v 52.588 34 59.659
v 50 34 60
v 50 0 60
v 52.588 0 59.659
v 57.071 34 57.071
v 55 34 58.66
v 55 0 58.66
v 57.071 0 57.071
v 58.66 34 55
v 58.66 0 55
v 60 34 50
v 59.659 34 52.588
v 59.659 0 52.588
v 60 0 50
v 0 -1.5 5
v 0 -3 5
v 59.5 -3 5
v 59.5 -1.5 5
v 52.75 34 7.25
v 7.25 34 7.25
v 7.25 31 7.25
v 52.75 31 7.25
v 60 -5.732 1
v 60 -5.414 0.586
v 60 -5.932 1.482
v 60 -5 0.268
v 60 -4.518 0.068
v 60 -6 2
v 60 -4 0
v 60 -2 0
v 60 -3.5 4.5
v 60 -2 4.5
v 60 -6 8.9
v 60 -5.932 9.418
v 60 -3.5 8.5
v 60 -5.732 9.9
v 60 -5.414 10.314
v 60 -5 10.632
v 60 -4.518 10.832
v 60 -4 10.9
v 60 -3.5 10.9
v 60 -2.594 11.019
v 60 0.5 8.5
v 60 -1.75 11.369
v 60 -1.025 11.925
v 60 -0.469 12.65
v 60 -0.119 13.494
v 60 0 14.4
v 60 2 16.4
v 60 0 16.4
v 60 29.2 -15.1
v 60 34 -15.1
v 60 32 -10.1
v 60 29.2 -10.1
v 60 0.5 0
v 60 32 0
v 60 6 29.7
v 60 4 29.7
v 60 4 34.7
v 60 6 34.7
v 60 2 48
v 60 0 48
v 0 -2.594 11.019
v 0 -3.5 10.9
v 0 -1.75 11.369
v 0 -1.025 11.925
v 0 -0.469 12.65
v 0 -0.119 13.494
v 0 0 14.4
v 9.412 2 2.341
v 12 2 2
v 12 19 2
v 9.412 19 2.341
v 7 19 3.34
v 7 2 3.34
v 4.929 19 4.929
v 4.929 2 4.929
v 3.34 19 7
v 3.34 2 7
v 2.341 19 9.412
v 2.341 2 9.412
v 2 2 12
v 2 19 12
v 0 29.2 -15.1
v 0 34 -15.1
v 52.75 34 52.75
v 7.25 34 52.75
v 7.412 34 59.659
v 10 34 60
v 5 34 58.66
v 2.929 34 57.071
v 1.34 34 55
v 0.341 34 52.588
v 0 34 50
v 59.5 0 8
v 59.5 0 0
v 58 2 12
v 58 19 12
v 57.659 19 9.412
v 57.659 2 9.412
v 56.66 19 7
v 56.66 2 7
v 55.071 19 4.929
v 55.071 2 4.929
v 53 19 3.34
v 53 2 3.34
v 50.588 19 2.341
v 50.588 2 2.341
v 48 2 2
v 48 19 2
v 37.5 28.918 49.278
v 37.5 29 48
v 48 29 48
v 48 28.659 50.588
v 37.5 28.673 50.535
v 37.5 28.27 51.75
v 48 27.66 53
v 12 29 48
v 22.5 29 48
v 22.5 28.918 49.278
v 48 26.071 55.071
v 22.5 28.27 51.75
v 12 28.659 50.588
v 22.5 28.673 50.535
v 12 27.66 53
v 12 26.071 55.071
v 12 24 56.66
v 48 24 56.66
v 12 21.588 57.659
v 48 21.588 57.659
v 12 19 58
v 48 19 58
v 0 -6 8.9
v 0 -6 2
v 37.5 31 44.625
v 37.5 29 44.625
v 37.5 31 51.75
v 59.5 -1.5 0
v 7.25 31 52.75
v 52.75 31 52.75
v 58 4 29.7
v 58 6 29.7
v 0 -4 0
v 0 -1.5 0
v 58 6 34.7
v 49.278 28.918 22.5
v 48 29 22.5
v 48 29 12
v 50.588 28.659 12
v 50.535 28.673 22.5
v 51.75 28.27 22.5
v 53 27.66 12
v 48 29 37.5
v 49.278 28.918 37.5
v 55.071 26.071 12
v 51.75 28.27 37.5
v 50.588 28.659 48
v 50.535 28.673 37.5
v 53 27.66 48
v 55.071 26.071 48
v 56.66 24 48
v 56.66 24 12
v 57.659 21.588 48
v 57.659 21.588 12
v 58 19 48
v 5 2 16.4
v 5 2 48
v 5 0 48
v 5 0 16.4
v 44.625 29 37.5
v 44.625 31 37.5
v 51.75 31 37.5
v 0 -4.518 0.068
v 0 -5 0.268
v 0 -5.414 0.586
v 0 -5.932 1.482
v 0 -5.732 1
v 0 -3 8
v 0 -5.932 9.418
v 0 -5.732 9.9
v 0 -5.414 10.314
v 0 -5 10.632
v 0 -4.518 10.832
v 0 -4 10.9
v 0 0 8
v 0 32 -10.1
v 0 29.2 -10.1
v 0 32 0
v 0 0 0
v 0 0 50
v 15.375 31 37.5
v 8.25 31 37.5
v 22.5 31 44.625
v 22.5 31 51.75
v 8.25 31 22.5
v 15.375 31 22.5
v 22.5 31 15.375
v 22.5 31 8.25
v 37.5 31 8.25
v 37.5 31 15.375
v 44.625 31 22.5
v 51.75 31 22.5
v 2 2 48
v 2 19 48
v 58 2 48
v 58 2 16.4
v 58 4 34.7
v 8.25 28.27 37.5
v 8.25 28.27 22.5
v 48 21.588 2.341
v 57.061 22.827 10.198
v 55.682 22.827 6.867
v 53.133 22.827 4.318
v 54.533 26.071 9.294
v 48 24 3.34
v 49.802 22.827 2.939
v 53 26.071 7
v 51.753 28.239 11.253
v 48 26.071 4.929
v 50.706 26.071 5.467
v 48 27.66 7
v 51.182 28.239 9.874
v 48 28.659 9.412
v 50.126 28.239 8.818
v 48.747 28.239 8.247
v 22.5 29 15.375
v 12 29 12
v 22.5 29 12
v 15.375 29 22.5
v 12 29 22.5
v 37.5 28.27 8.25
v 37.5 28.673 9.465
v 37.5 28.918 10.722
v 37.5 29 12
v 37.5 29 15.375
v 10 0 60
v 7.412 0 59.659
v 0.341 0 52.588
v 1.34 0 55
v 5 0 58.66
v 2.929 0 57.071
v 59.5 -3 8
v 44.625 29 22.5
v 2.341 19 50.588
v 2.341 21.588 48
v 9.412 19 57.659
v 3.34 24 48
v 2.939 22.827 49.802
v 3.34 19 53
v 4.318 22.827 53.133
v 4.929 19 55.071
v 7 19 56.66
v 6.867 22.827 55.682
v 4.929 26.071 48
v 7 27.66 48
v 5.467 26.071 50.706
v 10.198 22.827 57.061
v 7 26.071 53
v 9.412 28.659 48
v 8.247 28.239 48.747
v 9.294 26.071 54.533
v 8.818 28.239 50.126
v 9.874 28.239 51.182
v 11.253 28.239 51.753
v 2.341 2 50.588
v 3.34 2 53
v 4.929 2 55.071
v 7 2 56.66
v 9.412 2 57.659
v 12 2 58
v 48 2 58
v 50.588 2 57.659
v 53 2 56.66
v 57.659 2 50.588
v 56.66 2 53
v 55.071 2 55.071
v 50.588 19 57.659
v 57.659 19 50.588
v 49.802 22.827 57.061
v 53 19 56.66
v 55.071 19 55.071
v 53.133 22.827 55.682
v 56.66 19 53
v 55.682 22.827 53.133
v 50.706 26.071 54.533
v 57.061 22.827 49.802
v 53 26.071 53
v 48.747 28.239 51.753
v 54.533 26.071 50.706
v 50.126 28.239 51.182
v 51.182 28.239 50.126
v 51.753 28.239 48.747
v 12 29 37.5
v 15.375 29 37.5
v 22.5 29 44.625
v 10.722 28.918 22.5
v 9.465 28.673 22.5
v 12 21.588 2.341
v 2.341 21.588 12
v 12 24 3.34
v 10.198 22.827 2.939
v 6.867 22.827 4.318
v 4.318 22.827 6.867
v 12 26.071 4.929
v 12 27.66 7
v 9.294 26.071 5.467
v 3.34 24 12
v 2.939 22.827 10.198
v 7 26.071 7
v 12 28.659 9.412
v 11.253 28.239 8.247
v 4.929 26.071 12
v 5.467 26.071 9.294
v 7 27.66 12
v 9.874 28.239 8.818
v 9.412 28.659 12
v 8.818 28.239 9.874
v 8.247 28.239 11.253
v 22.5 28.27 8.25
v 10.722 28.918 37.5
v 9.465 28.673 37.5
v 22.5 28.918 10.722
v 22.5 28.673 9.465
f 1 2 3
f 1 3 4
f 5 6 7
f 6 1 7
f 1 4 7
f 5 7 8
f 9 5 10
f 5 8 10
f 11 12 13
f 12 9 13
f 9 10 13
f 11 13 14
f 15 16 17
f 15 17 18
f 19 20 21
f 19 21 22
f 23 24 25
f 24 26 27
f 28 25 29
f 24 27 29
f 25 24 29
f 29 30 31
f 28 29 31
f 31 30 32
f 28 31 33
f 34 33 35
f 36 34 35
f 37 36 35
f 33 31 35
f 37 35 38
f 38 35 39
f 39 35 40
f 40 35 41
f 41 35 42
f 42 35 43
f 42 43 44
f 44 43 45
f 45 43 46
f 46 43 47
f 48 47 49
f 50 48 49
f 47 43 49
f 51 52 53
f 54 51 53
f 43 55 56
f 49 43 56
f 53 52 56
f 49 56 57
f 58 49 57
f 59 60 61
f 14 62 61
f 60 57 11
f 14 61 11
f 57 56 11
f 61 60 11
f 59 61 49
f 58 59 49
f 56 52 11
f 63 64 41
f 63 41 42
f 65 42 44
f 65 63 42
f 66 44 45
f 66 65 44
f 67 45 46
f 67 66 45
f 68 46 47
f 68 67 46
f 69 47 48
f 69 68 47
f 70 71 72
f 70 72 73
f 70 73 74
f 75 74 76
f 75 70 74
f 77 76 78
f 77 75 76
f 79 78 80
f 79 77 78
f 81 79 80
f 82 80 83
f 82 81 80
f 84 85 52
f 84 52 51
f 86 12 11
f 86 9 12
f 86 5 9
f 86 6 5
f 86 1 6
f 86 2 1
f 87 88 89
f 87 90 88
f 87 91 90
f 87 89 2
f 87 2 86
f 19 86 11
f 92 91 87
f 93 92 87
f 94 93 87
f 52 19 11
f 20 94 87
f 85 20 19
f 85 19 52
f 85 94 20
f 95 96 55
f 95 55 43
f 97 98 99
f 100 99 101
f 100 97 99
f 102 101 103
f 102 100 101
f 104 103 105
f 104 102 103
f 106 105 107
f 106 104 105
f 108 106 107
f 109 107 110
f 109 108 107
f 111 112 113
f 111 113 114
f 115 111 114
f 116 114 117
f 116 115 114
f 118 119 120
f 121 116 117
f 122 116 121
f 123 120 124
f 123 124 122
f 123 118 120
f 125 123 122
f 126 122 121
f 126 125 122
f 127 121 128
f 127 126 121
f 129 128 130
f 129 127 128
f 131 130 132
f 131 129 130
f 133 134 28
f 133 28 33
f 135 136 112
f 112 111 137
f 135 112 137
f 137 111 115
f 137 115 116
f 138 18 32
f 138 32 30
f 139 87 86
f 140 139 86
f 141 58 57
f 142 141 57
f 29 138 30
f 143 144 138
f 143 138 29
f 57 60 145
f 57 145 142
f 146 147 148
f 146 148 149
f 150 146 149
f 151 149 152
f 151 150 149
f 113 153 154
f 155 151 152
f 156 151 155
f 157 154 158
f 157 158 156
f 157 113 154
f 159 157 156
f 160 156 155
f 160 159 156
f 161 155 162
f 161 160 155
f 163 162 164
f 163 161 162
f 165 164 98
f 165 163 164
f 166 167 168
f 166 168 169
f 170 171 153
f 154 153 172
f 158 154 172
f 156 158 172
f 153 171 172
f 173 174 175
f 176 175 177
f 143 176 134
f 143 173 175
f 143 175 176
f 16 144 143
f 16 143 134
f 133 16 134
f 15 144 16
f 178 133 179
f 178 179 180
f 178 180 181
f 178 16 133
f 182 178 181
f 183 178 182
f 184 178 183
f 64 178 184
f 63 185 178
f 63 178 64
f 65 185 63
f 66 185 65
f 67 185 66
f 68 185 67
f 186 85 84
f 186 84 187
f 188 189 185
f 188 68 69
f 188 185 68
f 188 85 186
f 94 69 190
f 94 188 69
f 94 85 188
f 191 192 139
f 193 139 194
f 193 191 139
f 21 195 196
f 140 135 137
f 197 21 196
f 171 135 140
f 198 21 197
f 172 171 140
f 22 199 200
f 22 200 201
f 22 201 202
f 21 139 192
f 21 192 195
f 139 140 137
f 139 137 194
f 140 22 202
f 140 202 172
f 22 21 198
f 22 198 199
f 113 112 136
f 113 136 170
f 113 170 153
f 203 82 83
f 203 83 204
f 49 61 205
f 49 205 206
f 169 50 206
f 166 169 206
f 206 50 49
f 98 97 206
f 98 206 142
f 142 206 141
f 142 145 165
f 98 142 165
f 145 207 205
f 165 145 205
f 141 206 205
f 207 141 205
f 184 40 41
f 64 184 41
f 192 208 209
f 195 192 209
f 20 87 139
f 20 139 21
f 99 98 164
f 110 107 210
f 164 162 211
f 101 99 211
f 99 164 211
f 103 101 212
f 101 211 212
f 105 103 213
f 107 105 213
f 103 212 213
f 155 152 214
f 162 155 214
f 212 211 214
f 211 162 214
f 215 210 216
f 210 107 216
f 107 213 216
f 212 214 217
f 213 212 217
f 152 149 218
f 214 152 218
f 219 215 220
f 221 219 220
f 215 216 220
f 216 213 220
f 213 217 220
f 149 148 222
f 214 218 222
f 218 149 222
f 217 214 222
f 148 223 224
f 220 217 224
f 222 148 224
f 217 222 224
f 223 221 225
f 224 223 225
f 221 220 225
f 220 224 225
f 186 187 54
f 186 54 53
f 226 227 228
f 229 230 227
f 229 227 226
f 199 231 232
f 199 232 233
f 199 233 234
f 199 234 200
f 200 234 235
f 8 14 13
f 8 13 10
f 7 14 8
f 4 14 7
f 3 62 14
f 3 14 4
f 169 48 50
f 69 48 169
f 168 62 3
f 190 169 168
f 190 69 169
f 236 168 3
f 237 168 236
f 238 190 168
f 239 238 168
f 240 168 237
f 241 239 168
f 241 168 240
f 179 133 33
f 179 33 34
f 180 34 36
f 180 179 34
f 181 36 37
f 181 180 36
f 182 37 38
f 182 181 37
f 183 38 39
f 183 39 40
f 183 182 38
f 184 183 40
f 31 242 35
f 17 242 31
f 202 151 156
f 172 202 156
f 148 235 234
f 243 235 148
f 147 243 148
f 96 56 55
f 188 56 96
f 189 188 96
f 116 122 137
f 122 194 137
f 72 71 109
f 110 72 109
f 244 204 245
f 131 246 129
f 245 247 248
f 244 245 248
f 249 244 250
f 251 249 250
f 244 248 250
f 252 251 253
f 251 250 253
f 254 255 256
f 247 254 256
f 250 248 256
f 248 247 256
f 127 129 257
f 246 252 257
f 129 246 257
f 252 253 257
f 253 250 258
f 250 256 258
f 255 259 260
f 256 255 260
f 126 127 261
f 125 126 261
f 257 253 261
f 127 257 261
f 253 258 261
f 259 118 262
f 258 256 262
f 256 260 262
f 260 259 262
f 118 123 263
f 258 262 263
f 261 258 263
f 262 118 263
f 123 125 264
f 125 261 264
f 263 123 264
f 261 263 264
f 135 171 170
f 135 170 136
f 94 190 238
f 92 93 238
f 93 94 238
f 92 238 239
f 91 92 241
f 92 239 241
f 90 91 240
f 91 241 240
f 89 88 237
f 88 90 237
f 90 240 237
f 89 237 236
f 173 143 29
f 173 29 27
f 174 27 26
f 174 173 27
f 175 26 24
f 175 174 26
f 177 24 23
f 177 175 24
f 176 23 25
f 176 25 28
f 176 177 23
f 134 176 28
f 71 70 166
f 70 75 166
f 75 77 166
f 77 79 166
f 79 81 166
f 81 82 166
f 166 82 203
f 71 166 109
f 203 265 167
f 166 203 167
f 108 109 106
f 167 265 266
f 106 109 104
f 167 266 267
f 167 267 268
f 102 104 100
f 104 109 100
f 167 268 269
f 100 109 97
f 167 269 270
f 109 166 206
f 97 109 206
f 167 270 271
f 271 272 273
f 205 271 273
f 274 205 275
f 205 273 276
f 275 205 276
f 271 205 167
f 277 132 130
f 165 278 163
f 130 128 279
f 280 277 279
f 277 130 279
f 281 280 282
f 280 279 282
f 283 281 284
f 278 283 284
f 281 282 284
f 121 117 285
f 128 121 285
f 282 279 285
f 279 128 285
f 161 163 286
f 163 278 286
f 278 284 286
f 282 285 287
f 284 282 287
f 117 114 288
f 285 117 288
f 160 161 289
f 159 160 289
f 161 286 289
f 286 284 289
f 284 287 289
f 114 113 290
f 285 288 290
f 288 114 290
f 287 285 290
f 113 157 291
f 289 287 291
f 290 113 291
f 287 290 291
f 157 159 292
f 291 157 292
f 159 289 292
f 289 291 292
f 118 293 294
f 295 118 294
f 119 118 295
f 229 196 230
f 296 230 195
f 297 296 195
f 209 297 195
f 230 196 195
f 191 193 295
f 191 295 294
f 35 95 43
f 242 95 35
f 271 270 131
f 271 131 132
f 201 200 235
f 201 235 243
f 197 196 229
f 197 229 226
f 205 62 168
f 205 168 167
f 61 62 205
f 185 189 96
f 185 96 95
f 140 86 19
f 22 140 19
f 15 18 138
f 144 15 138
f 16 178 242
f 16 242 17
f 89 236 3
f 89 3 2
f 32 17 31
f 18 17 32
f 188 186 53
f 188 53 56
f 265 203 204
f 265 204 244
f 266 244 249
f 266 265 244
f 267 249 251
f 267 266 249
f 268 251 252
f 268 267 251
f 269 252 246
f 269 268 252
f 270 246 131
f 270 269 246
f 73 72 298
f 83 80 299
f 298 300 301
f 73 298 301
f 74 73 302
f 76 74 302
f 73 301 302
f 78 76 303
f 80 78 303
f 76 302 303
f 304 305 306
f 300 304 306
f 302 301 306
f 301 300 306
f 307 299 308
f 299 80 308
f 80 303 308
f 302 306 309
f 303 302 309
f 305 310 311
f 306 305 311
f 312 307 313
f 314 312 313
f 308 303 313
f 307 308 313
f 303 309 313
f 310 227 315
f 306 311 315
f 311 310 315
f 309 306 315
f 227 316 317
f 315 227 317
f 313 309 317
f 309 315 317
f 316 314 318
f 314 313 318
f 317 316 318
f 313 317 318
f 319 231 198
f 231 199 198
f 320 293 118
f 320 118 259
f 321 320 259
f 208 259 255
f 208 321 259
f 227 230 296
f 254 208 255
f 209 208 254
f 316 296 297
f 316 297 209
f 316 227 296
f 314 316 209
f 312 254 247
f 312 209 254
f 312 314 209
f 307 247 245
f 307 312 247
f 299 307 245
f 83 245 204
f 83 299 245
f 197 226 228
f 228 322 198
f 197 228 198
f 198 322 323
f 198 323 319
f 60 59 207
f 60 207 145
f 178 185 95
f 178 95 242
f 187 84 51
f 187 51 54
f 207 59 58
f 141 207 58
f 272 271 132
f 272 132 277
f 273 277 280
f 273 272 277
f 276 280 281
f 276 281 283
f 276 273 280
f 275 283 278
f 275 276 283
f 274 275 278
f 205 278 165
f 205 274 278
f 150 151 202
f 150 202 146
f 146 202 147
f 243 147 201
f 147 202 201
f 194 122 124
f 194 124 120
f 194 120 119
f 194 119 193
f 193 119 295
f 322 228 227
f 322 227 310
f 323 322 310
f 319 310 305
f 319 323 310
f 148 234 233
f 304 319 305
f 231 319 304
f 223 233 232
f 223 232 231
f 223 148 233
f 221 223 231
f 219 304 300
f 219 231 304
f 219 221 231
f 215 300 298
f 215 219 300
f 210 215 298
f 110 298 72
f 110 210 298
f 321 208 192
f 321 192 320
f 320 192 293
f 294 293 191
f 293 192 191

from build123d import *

# Parameters (mm, degrees)
BOSS_EXTRU_1_DEPTH       = 60
ESQUISSE4_W              = 45.5
ESQUISSE4_H              = 45.5
ENL_V_MAT_EXTRU_2_DEPTH  = 3
ENL_V_MAT_EXTRU_4_DEPTH  = 2
ENL_V_START              = -2
ESQUISSE5_W              = 56
ESQUISSE5_H              = 56
ENL_V_MAT_EXTRU_3_DEPTH  = 27
CONG_1_R                 = 10
CHANFREIN1_SIZE          = 0.5
ESQUISSE15_W             = 31.6
ESQUISSE15_H             = 2
ESQUISSE15_W_2           = 5
ENL_V_MAT_EXTRU_11_DEPTH = 55


with BuildPart() as part:
    # Esquisse1 → Boss.-Extru.1 (new body)
    with BuildSketch(Plane(origin=(0, 0, 0), x_dir=(0, 0, -1), z_dir=(1, 0, 0))):
        with BuildLine():
            Line((0, 0), (-8, 0))
            Line((-8, 0), (-8, -3))
            Line((-8, -3), (-5, -3))
            Line((-5, -3), (-5, -1.5))
            Line((-5, -1.5), (0, -1.5))
            Line((0, -1.5), (0, -4))
            ThreePointArc((0, -4), (-0.585786438, -5.414213562), (-2, -6))
            Line((-2, -6), (-8.9, -6))
            ThreePointArc((-8.9, -6), (-10.314213562, -5.414213562), (-10.9, -4))
            Line((-10.9, -4), (-10.9, -3.5))
            ThreePointArc((-10.9, -3.5), (-11.925126266, -1.025126266), (-14.4, 0))
            Line((-14.4, 0), (-60, 0))
            Line((-60, 0), (-60, 34))
            Line((-60, 34), (15.1, 34))
            Line((15.1, 34), (15.1, 29.2))
            Line((15.1, 29.2), (10.1, 29.2))
            Line((10.1, 29.2), (10.1, 32))
            Line((10.1, 32), (0, 32))
            Line((0, 32), (0, 0))
        make_face()
    extrude(amount=BOSS_EXTRU_1_DEPTH)

    # Esquisse4 → Enlèv. mat.-Extru.2 (cut)
    with BuildSketch(Plane(origin=(0, 34, 0), x_dir=(1, 0, 0), z_dir=(0, 1, 0))):
        with Locations((30, -30)):
            Rectangle(ESQUISSE4_W, ESQUISSE4_H)
    extrude(amount=-ENL_V_MAT_EXTRU_2_DEPTH, mode=Mode.SUBTRACT)

    # Esquisse6 → Enlèv. mat.-Extru.4 (cut)
    with BuildSketch(Plane(origin=(0, 31, 0), x_dir=(1, 0, 0), z_dir=(0, 1, 0))):
        Polygon((8.25, -22.5), (15.375, -22.5), (22.5, -15.375), (22.5, -8.25), (37.5, -8.25), (37.5, -15.375), (44.625, -22.5), (51.75, -22.5), (51.75, -37.5), (44.625, -37.5), (37.5, -44.625), (37.5, -51.75), (22.5, -51.75), (22.5, -44.625), (15.375, -37.5), (8.25, -37.5), align=None)
    extrude(amount=-ENL_V_MAT_EXTRU_4_DEPTH, mode=Mode.SUBTRACT)

    # Esquisse5 → Enlèv. mat.-Extru.3 (cut)
    with BuildSketch(Plane.XZ.offset(ENL_V_START)):
        with Locations((30, 30)):
            Rectangle(ESQUISSE5_W, ESQUISSE5_H)
    extrude(amount=-ENL_V_MAT_EXTRU_3_DEPTH, mode=Mode.SUBTRACT)

    # Congé1
    # the kernel refuses this fillet: 10 mm, written as the material it adds along each edge
    with BuildSketch(Plane(origin=(48, 19, 12), x_dir=(1, 0, 0), z_dir=(0, 1, 0))) as cong_1_piece_1_section:
        Polygon((0, 0), (CONG_1_R, 0), (CONG_1_R, CONG_1_R), (0, CONG_1_R), align=None)
    cong_1_piece_1 = extrude(amount=CONG_1_R, mode=Mode.PRIVATE)
    cong_1_piece_1 = cong_1_piece_1 - Plane(origin=(48, 19, 12), x_dir=(-0.7071067811865476, 0, 0.7071067811865475), z_dir=(0, 1, 0)) * Sphere(CONG_1_R, mode=Mode.PRIVATE)
    add(cong_1_piece_1)
    with BuildSketch(Plane(origin=(12, 19, 12), x_dir=(-1, 0, 0), z_dir=(0, 1, 0))) as cong_1_piece_2_section:
        Polygon((0, 0), (CONG_1_R, 0), (CONG_1_R, -CONG_1_R), (0, -CONG_1_R), align=None)
    cong_1_piece_2 = extrude(amount=CONG_1_R, mode=Mode.PRIVATE)
    cong_1_piece_2 = cong_1_piece_2 - Plane(origin=(12, 19, 12), x_dir=(0.7071067811865475, 0, 0.7071067811865477), z_dir=(0, 1, 0)) * Sphere(CONG_1_R, mode=Mode.PRIVATE)
    add(cong_1_piece_2)
    with BuildSketch(Plane(origin=(48, 19, 48), x_dir=(0, 0, 1), z_dir=(0, 1, 0))) as cong_1_piece_3_section:
        Polygon((0, 0), (CONG_1_R, 0), (CONG_1_R, CONG_1_R), (0, CONG_1_R), align=None)
    cong_1_piece_3 = extrude(amount=CONG_1_R, mode=Mode.PRIVATE)
    cong_1_piece_3 = cong_1_piece_3 - Plane(origin=(48, 19, 48), x_dir=(-0.7071067811865475, 0, -0.7071067811865477), z_dir=(0, 1, 0)) * Sphere(CONG_1_R, mode=Mode.PRIVATE)
    add(cong_1_piece_3)
    with BuildSketch(Plane(origin=(12, 19, 48), x_dir=(0, 0, 1), z_dir=(0, 1, 0))) as cong_1_piece_4_section:
        Polygon((0, 0), (CONG_1_R, 0), (CONG_1_R, -CONG_1_R), (0, -CONG_1_R), align=None)
    cong_1_piece_4 = extrude(amount=CONG_1_R, mode=Mode.PRIVATE)
    cong_1_piece_4 = cong_1_piece_4 - Plane(origin=(12, 19, 48), x_dir=(0.7071067811865476, 0, -0.7071067811865475), z_dir=(0, 1, 0)) * Sphere(CONG_1_R, mode=Mode.PRIVATE)
    add(cong_1_piece_4)
    with BuildSketch(Plane(origin=(48, 29, 2), x_dir=(0, 0, 1), z_dir=(-1, 0, 0))) as cong_1_piece_5_section:
        with BuildLine():
            CenterArc((CONG_1_R, -CONG_1_R), CONG_1_R, 90, 90)
            Line((0, -CONG_1_R), (0, 0))
            Line((0, 0), (CONG_1_R, 0))
        make_face()
    cong_1_piece_5 = extrude(amount=36, mode=Mode.PRIVATE)
    cong_1_piece_5 = split(cong_1_piece_5, bisect_by=Plane(origin=(37.5, 28.926962603, 9.610234862), z_dir=(1, 0, 0)), keep=Keep.TOP, mode=Mode.PRIVATE)
    cong_1_piece_5 = split(cong_1_piece_5, bisect_by=Plane(origin=(42.75, 28.926962603, 8.25), z_dir=(0, 0, 1)), keep=Keep.TOP, mode=Mode.PRIVATE)
    add(cong_1_piece_5)
    with BuildSketch(Plane(origin=(48, 29, 2), x_dir=(0, 0, 1), z_dir=(-1, 0, 0))) as cong_1_piece_6_section:
        with BuildLine():
            CenterArc((CONG_1_R, -CONG_1_R), CONG_1_R, 90, 90)
            Line((0, -CONG_1_R), (0, 0))
            Line((0, 0), (CONG_1_R, 0))
        make_face()
    cong_1_piece_6 = extrude(amount=36, mode=Mode.PRIVATE)
    cong_1_piece_6 = split(cong_1_piece_6, bisect_by=Plane(origin=(37.5, 26.584629987, 3.89445771), z_dir=(1, 0, 0)), keep=Keep.TOP, mode=Mode.PRIVATE)
    cong_1_piece_6 = split(cong_1_piece_6, bisect_by=Plane(origin=(42.75, 26.584629987, 8.25), z_dir=(0, 0, -1)), keep=Keep.TOP, mode=Mode.PRIVATE)
    add(cong_1_piece_6)
    with BuildSketch(Plane(origin=(48, 29, 2), x_dir=(0, 0, 1), z_dir=(-1, 0, 0))) as cong_1_piece_7_section:
        with BuildLine():
            CenterArc((CONG_1_R, -CONG_1_R), CONG_1_R, 90, 90)
            Line((0, -CONG_1_R), (0, 0))
            Line((0, 0), (CONG_1_R, 0))
        make_face()
    cong_1_piece_7 = extrude(amount=36, mode=Mode.PRIVATE)
    cong_1_piece_7 = split(cong_1_piece_7, bisect_by=Plane(origin=(37.5, 26.584629987, 3.89445771), z_dir=(-1, 0, 0)), keep=Keep.TOP, mode=Mode.PRIVATE)
    cong_1_piece_7 = split(cong_1_piece_7, bisect_by=Plane(origin=(30, 26.584629987, 8.25), z_dir=(0, 0, -1)), keep=Keep.TOP, mode=Mode.PRIVATE)
    cong_1_piece_7 = split(cong_1_piece_7, bisect_by=Plane(origin=(22.5, 26.584629987, 3.89445771), z_dir=(1, 0, 0)), keep=Keep.TOP, mode=Mode.PRIVATE)
    add(cong_1_piece_7)
    with BuildSketch(Plane(origin=(48, 29, 2), x_dir=(0, 0, 1), z_dir=(-1, 0, 0))) as cong_1_piece_8_section:
        with BuildLine():
            CenterArc((CONG_1_R, -CONG_1_R), CONG_1_R, 90, 90)
            Line((0, -CONG_1_R), (0, 0))
            Line((0, 0), (CONG_1_R, 0))
        make_face()
    cong_1_piece_8 = extrude(amount=36, mode=Mode.PRIVATE)
    cong_1_piece_8 = split(cong_1_piece_8, bisect_by=Plane(origin=(17.25, 28.926962603, 8.25), z_dir=(0, 0, 1)), keep=Keep.TOP, mode=Mode.PRIVATE)
    cong_1_piece_8 = split(cong_1_piece_8, bisect_by=Plane(origin=(22.5, 28.926962603, 9.610234862), z_dir=(-1, 0, 0)), keep=Keep.TOP, mode=Mode.PRIVATE)
    add(cong_1_piece_8)
    with BuildSketch(Plane(origin=(48, 29, 2), x_dir=(0, 0, 1), z_dir=(-1, 0, 0))) as cong_1_piece_9_section:
        with BuildLine():
            CenterArc((CONG_1_R, -CONG_1_R), CONG_1_R, 90, 90)
            Line((0, -CONG_1_R), (0, 0))
            Line((0, 0), (CONG_1_R, 0))
        make_face()
    cong_1_piece_9 = extrude(amount=36, mode=Mode.PRIVATE)
    cong_1_piece_9 = split(cong_1_piece_9, bisect_by=Plane(origin=(17.25, 26.584629987, 8.25), z_dir=(0, 0, -1)), keep=Keep.TOP, mode=Mode.PRIVATE)
    cong_1_piece_9 = split(cong_1_piece_9, bisect_by=Plane(origin=(22.5, 26.584629987, 3.89445771), z_dir=(-1, 0, 0)), keep=Keep.TOP, mode=Mode.PRIVATE)
    add(cong_1_piece_9)
    with BuildSketch(Plane(origin=(58, 29, 48), x_dir=(-1, 0, 0), z_dir=(0, 0, -1))) as cong_1_piece_10_section:
        with BuildLine():
            CenterArc((CONG_1_R, -CONG_1_R), CONG_1_R, 90, 90)
            Line((0, -CONG_1_R), (0, 0))
            Line((0, 0), (CONG_1_R, 0))
        make_face()
    cong_1_piece_10 = extrude(amount=36, mode=Mode.PRIVATE)
    cong_1_piece_10 = split(cong_1_piece_10, bisect_by=Plane(origin=(50.389765138, 28.926962603, 37.5), z_dir=(0, 0, 1)), keep=Keep.TOP, mode=Mode.PRIVATE)
    cong_1_piece_10 = split(cong_1_piece_10, bisect_by=Plane(origin=(51.75, 28.926962603, 42.75), z_dir=(-1, 0, 0)), keep=Keep.TOP, mode=Mode.PRIVATE)
    add(cong_1_piece_10)
    with BuildSketch(Plane(origin=(58, 29, 48), x_dir=(-1, 0, 0), z_dir=(0, 0, -1))) as cong_1_piece_11_section:
        with BuildLine():
            CenterArc((CONG_1_R, -CONG_1_R), CONG_1_R, 90, 90)
            Line((0, -CONG_1_R), (0, 0))
            Line((0, 0), (CONG_1_R, 0))
        make_face()
    cong_1_piece_11 = extrude(amount=36, mode=Mode.PRIVATE)
    cong_1_piece_11 = split(cong_1_piece_11, bisect_by=Plane(origin=(56.10554229, 26.584629987, 37.5), z_dir=(0, 0, 1)), keep=Keep.TOP, mode=Mode.PRIVATE)
    cong_1_piece_11 = split(cong_1_piece_11, bisect_by=Plane(origin=(51.75, 26.584629987, 42.75), z_dir=(1, 0, 0)), keep=Keep.TOP, mode=Mode.PRIVATE)
    add(cong_1_piece_11)
    with BuildSketch(Plane(origin=(58, 29, 48), x_dir=(-1, 0, 0), z_dir=(0, 0, -1))) as cong_1_piece_12_section:
        with BuildLine():
            CenterArc((CONG_1_R, -CONG_1_R), CONG_1_R, 90, 90)
            Line((0, -CONG_1_R), (0, 0))
            Line((0, 0), (CONG_1_R, 0))
        make_face()
    cong_1_piece_12 = extrude(amount=36, mode=Mode.PRIVATE)
    cong_1_piece_12 = split(cong_1_piece_12, bisect_by=Plane(origin=(56.10554229, 26.584629987, 37.5), z_dir=(0, 0, -1)), keep=Keep.TOP, mode=Mode.PRIVATE)
    cong_1_piece_12 = split(cong_1_piece_12, bisect_by=Plane(origin=(51.75, 26.584629987, 30), z_dir=(1, 0, 0)), keep=Keep.TOP, mode=Mode.PRIVATE)
    cong_1_piece_12 = split(cong_1_piece_12, bisect_by=Plane(origin=(56.10554229, 26.584629987, 22.5), z_dir=(0, 0, 1)), keep=Keep.TOP, mode=Mode.PRIVATE)
    add(cong_1_piece_12)
    with BuildSketch(Plane(origin=(58, 29, 48), x_dir=(-1, 0, 0), z_dir=(0, 0, -1))) as cong_1_piece_13_section:
        with BuildLine():
            CenterArc((CONG_1_R, -CONG_1_R), CONG_1_R, 90, 90)
            Line((0, -CONG_1_R), (0, 0))
            Line((0, 0), (CONG_1_R, 0))
        make_face()
    cong_1_piece_13 = extrude(amount=36, mode=Mode.PRIVATE)
    cong_1_piece_13 = split(cong_1_piece_13, bisect_by=Plane(origin=(51.75, 28.926962603, 17.25), z_dir=(-1, 0, 0)), keep=Keep.TOP, mode=Mode.PRIVATE)
    cong_1_piece_13 = split(cong_1_piece_13, bisect_by=Plane(origin=(50.389765138, 28.926962603, 22.5), z_dir=(0, 0, -1)), keep=Keep.TOP, mode=Mode.PRIVATE)
    add(cong_1_piece_13)
    with BuildSketch(Plane(origin=(58, 29, 48), x_dir=(-1, 0, 0), z_dir=(0, 0, -1))) as cong_1_piece_14_section:
        with BuildLine():
            CenterArc((CONG_1_R, -CONG_1_R), CONG_1_R, 90, 90)
            Line((0, -CONG_1_R), (0, 0))
            Line((0, 0), (CONG_1_R, 0))
        make_face()
    cong_1_piece_14 = extrude(amount=36, mode=Mode.PRIVATE)
    cong_1_piece_14 = split(cong_1_piece_14, bisect_by=Plane(origin=(51.75, 26.584629987, 17.25), z_dir=(1, 0, 0)), keep=Keep.TOP, mode=Mode.PRIVATE)
    cong_1_piece_14 = split(cong_1_piece_14, bisect_by=Plane(origin=(56.10554229, 26.584629987, 22.5), z_dir=(0, 0, -1)), keep=Keep.TOP, mode=Mode.PRIVATE)
    add(cong_1_piece_14)
    with BuildSketch(Plane(origin=(12, 29, 58), x_dir=(0, 0, -1), z_dir=(1, 0, 0))) as cong_1_piece_15_section:
        with BuildLine():
            CenterArc((CONG_1_R, -CONG_1_R), CONG_1_R, 90, 90)
            Line((0, -CONG_1_R), (0, 0))
            Line((0, 0), (CONG_1_R, 0))
        make_face()
    cong_1_piece_15 = extrude(amount=36, mode=Mode.PRIVATE)
    cong_1_piece_15 = split(cong_1_piece_15, bisect_by=Plane(origin=(22.5, 28.926962603, 50.389765138), z_dir=(-1, 0, 0)), keep=Keep.TOP, mode=Mode.PRIVATE)
    cong_1_piece_15 = split(cong_1_piece_15, bisect_by=Plane(origin=(17.25, 28.926962603, 51.75), z_dir=(0, 0, -1)), keep=Keep.TOP, mode=Mode.PRIVATE)
    add(cong_1_piece_15)
    with BuildSketch(Plane(origin=(12, 29, 58), x_dir=(0, 0, -1), z_dir=(1, 0, 0))) as cong_1_piece_16_section:
        with BuildLine():
            CenterArc((CONG_1_R, -CONG_1_R), CONG_1_R, 90, 90)
            Line((0, -CONG_1_R), (0, 0))
            Line((0, 0), (CONG_1_R, 0))
        make_face()
    cong_1_piece_16 = extrude(amount=36, mode=Mode.PRIVATE)
    cong_1_piece_16 = split(cong_1_piece_16, bisect_by=Plane(origin=(22.5, 26.584629987, 56.10554229), z_dir=(-1, 0, 0)), keep=Keep.TOP, mode=Mode.PRIVATE)
    cong_1_piece_16 = split(cong_1_piece_16, bisect_by=Plane(origin=(17.25, 26.584629987, 51.75), z_dir=(0, 0, 1)), keep=Keep.TOP, mode=Mode.PRIVATE)
    add(cong_1_piece_16)
    with BuildSketch(Plane(origin=(12, 29, 58), x_dir=(0, 0, -1), z_dir=(1, 0, 0))) as cong_1_piece_17_section:
        with BuildLine():
            CenterArc((CONG_1_R, -CONG_1_R), CONG_1_R, 90, 90)
            Line((0, -CONG_1_R), (0, 0))
            Line((0, 0), (CONG_1_R, 0))
        make_face()
    cong_1_piece_17 = extrude(amount=36, mode=Mode.PRIVATE)
    cong_1_piece_17 = split(cong_1_piece_17, bisect_by=Plane(origin=(22.5, 26.584629987, 56.10554229), z_dir=(1, 0, 0)), keep=Keep.TOP, mode=Mode.PRIVATE)
    cong_1_piece_17 = split(cong_1_piece_17, bisect_by=Plane(origin=(30, 26.584629987, 51.75), z_dir=(0, 0, 1)), keep=Keep.TOP, mode=Mode.PRIVATE)
    cong_1_piece_17 = split(cong_1_piece_17, bisect_by=Plane(origin=(37.5, 26.584629987, 56.10554229), z_dir=(-1, 0, 0)), keep=Keep.TOP, mode=Mode.PRIVATE)
    add(cong_1_piece_17)
    with BuildSketch(Plane(origin=(12, 29, 58), x_dir=(0, 0, -1), z_dir=(1, 0, 0))) as cong_1_piece_18_section:
        with BuildLine():
            CenterArc((CONG_1_R, -CONG_1_R), CONG_1_R, 90, 90)
            Line((0, -CONG_1_R), (0, 0))
            Line((0, 0), (CONG_1_R, 0))
        make_face()
    cong_1_piece_18 = extrude(amount=36, mode=Mode.PRIVATE)
    cong_1_piece_18 = split(cong_1_piece_18, bisect_by=Plane(origin=(42.75, 28.926962603, 51.75), z_dir=(0, 0, -1)), keep=Keep.TOP, mode=Mode.PRIVATE)
    cong_1_piece_18 = split(cong_1_piece_18, bisect_by=Plane(origin=(37.5, 28.926962603, 50.389765138), z_dir=(1, 0, 0)), keep=Keep.TOP, mode=Mode.PRIVATE)
    add(cong_1_piece_18)
    with BuildSketch(Plane(origin=(12, 29, 58), x_dir=(0, 0, -1), z_dir=(1, 0, 0))) as cong_1_piece_19_section:
        with BuildLine():
            CenterArc((CONG_1_R, -CONG_1_R), CONG_1_R, 90, 90)
            Line((0, -CONG_1_R), (0, 0))
            Line((0, 0), (CONG_1_R, 0))
        make_face()
    cong_1_piece_19 = extrude(amount=36, mode=Mode.PRIVATE)
    cong_1_piece_19 = split(cong_1_piece_19, bisect_by=Plane(origin=(42.75, 26.584629987, 51.75), z_dir=(0, 0, 1)), keep=Keep.TOP, mode=Mode.PRIVATE)
    cong_1_piece_19 = split(cong_1_piece_19, bisect_by=Plane(origin=(37.5, 26.584629987, 56.10554229), z_dir=(1, 0, 0)), keep=Keep.TOP, mode=Mode.PRIVATE)
    add(cong_1_piece_19)
    with BuildSketch(Plane(origin=(2, 29, 12), x_dir=(1, 0, 0), z_dir=(0, 0, 1))) as cong_1_piece_20_section:
        with BuildLine():
            CenterArc((CONG_1_R, -CONG_1_R), CONG_1_R, 90, 90)
            Line((0, -CONG_1_R), (0, 0))
            Line((0, 0), (CONG_1_R, 0))
        make_face()
    cong_1_piece_20 = extrude(amount=36, mode=Mode.PRIVATE)
    cong_1_piece_20 = split(cong_1_piece_20, bisect_by=Plane(origin=(8.25, 28.926962603, 17.25), z_dir=(1, 0, 0)), keep=Keep.TOP, mode=Mode.PRIVATE)
    cong_1_piece_20 = split(cong_1_piece_20, bisect_by=Plane(origin=(9.610234862, 28.926962603, 22.5), z_dir=(0, 0, -1)), keep=Keep.TOP, mode=Mode.PRIVATE)
    add(cong_1_piece_20)
    with BuildSketch(Plane(origin=(2, 29, 12), x_dir=(1, 0, 0), z_dir=(0, 0, 1))) as cong_1_piece_21_section:
        with BuildLine():
            CenterArc((CONG_1_R, -CONG_1_R), CONG_1_R, 90, 90)
            Line((0, -CONG_1_R), (0, 0))
            Line((0, 0), (CONG_1_R, 0))
        make_face()
    cong_1_piece_21 = extrude(amount=36, mode=Mode.PRIVATE)
    cong_1_piece_21 = split(cong_1_piece_21, bisect_by=Plane(origin=(8.25, 26.584629987, 17.25), z_dir=(-1, 0, 0)), keep=Keep.TOP, mode=Mode.PRIVATE)
    cong_1_piece_21 = split(cong_1_piece_21, bisect_by=Plane(origin=(3.89445771, 26.584629987, 22.5), z_dir=(0, 0, -1)), keep=Keep.TOP, mode=Mode.PRIVATE)
    add(cong_1_piece_21)
    with BuildSketch(Plane(origin=(2, 29, 12), x_dir=(1, 0, 0), z_dir=(0, 0, 1))) as cong_1_piece_22_section:
        with BuildLine():
            CenterArc((CONG_1_R, -CONG_1_R), CONG_1_R, 90, 90)
            Line((0, -CONG_1_R), (0, 0))
            Line((0, 0), (CONG_1_R, 0))
        make_face()
    cong_1_piece_22 = extrude(amount=36, mode=Mode.PRIVATE)
    cong_1_piece_22 = split(cong_1_piece_22, bisect_by=Plane(origin=(8.25, 26.584629987, 30), z_dir=(-1, 0, 0)), keep=Keep.TOP, mode=Mode.PRIVATE)
    cong_1_piece_22 = split(cong_1_piece_22, bisect_by=Plane(origin=(3.89445771, 26.584629987, 37.5), z_dir=(0, 0, -1)), keep=Keep.TOP, mode=Mode.PRIVATE)
    cong_1_piece_22 = split(cong_1_piece_22, bisect_by=Plane(origin=(3.89445771, 26.584629987, 22.5), z_dir=(0, 0, 1)), keep=Keep.TOP, mode=Mode.PRIVATE)
    add(cong_1_piece_22)
    with BuildSketch(Plane(origin=(2, 29, 12), x_dir=(1, 0, 0), z_dir=(0, 0, 1))) as cong_1_piece_23_section:
        with BuildLine():
            CenterArc((CONG_1_R, -CONG_1_R), CONG_1_R, 90, 90)
            Line((0, -CONG_1_R), (0, 0))
            Line((0, 0), (CONG_1_R, 0))
        make_face()
    cong_1_piece_23 = extrude(amount=36, mode=Mode.PRIVATE)
    cong_1_piece_23 = split(cong_1_piece_23, bisect_by=Plane(origin=(8.25, 28.926962603, 42.75), z_dir=(1, 0, 0)), keep=Keep.TOP, mode=Mode.PRIVATE)
    cong_1_piece_23 = split(cong_1_piece_23, bisect_by=Plane(origin=(9.610234862, 28.926962603, 37.5), z_dir=(0, 0, 1)), keep=Keep.TOP, mode=Mode.PRIVATE)
    add(cong_1_piece_23)
    with BuildSketch(Plane(origin=(2, 29, 12), x_dir=(1, 0, 0), z_dir=(0, 0, 1))) as cong_1_piece_24_section:
        with BuildLine():
            CenterArc((CONG_1_R, -CONG_1_R), CONG_1_R, 90, 90)
            Line((0, -CONG_1_R), (0, 0))
            Line((0, 0), (CONG_1_R, 0))
        make_face()
    cong_1_piece_24 = extrude(amount=36, mode=Mode.PRIVATE)
    cong_1_piece_24 = split(cong_1_piece_24, bisect_by=Plane(origin=(8.25, 26.584629987, 42.75), z_dir=(-1, 0, 0)), keep=Keep.TOP, mode=Mode.PRIVATE)
    cong_1_piece_24 = split(cong_1_piece_24, bisect_by=Plane(origin=(3.89445771, 26.584629987, 37.5), z_dir=(0, 0, 1)), keep=Keep.TOP, mode=Mode.PRIVATE)
    add(cong_1_piece_24)
    with BuildSketch(Plane(origin=(58, 2, 58), x_dir=(-1, 0, 0), z_dir=(0, 1, 0)), Plane(origin=(58, 2, 2), x_dir=(0, 0, 1), z_dir=(0, 1, 0))) as cong_1_piece_25:
        with BuildLine():
            CenterArc((CONG_1_R, -CONG_1_R), CONG_1_R, 90, 90)
            Line((0, -CONG_1_R), (0, 0))
            Line((0, 0), (CONG_1_R, 0))
        make_face()
    extrude(amount=17)
    with BuildSketch(Plane(origin=(2, 2, 2), x_dir=(0, 0, 1), z_dir=(0, 1, 0)), Plane(origin=(2, 2, 58), x_dir=(1, 0, 0), z_dir=(0, 1, 0))) as cong_1_piece_26:
        with BuildLine():
            CenterArc((CONG_1_R, CONG_1_R), CONG_1_R, 180, 90)
            Line((0, CONG_1_R), (0, 0))
            Line((0, 0), (CONG_1_R, 0))
        make_face()
    extrude(amount=17)
    # the kernel refuses this fillet: 10 mm, written as the material it takes off along each edge
    with BuildSketch(Plane(origin=(60, -25, 60), x_dir=(0, 0, -1), z_dir=(0, 1, 0)), Plane(origin=(0, -25, 60), x_dir=(1, 0, 0), z_dir=(0, 1, 0))) as cong_1_2_piece_1:
        with BuildLine():
            CenterArc((CONG_1_R, CONG_1_R), CONG_1_R, 180, 90)
            Line((0, CONG_1_R), (0, 0))
            Line((0, 0), (CONG_1_R, 0))
        make_face()
    extrude(amount=84, mode=Mode.SUBTRACT)

    # Chanfrein1
    chanfrein1_edges = [part.edges().sort_by_distance(p)[0] for p in [
        (60, -1.5, 2.5),
        (60, -2.25, 5),
        (60, -3, 6.5),
        (60, -1.5, 8),
        (60, 0, 4),
    ]]
    chamfer(chanfrein1_edges, length=CHANFREIN1_SIZE)

    # Esquisse15 → Enlèv. mat.-Extru.11 (cut)
    with BuildSketch(Plane(origin=(60, 0, 0), x_dir=(0, 0, -1), z_dir=(1, 0, 0))):
        with Locations((-32.2, 1)):
            Rectangle(ESQUISSE15_W, ESQUISSE15_H)
        with Locations((-32.2, 5)):
            Rectangle(ESQUISSE15_W_2, ESQUISSE15_H)
    extrude(amount=-ENL_V_MAT_EXTRU_11_DEPTH, mode=Mode.SUBTRACT)


solid = part.part
